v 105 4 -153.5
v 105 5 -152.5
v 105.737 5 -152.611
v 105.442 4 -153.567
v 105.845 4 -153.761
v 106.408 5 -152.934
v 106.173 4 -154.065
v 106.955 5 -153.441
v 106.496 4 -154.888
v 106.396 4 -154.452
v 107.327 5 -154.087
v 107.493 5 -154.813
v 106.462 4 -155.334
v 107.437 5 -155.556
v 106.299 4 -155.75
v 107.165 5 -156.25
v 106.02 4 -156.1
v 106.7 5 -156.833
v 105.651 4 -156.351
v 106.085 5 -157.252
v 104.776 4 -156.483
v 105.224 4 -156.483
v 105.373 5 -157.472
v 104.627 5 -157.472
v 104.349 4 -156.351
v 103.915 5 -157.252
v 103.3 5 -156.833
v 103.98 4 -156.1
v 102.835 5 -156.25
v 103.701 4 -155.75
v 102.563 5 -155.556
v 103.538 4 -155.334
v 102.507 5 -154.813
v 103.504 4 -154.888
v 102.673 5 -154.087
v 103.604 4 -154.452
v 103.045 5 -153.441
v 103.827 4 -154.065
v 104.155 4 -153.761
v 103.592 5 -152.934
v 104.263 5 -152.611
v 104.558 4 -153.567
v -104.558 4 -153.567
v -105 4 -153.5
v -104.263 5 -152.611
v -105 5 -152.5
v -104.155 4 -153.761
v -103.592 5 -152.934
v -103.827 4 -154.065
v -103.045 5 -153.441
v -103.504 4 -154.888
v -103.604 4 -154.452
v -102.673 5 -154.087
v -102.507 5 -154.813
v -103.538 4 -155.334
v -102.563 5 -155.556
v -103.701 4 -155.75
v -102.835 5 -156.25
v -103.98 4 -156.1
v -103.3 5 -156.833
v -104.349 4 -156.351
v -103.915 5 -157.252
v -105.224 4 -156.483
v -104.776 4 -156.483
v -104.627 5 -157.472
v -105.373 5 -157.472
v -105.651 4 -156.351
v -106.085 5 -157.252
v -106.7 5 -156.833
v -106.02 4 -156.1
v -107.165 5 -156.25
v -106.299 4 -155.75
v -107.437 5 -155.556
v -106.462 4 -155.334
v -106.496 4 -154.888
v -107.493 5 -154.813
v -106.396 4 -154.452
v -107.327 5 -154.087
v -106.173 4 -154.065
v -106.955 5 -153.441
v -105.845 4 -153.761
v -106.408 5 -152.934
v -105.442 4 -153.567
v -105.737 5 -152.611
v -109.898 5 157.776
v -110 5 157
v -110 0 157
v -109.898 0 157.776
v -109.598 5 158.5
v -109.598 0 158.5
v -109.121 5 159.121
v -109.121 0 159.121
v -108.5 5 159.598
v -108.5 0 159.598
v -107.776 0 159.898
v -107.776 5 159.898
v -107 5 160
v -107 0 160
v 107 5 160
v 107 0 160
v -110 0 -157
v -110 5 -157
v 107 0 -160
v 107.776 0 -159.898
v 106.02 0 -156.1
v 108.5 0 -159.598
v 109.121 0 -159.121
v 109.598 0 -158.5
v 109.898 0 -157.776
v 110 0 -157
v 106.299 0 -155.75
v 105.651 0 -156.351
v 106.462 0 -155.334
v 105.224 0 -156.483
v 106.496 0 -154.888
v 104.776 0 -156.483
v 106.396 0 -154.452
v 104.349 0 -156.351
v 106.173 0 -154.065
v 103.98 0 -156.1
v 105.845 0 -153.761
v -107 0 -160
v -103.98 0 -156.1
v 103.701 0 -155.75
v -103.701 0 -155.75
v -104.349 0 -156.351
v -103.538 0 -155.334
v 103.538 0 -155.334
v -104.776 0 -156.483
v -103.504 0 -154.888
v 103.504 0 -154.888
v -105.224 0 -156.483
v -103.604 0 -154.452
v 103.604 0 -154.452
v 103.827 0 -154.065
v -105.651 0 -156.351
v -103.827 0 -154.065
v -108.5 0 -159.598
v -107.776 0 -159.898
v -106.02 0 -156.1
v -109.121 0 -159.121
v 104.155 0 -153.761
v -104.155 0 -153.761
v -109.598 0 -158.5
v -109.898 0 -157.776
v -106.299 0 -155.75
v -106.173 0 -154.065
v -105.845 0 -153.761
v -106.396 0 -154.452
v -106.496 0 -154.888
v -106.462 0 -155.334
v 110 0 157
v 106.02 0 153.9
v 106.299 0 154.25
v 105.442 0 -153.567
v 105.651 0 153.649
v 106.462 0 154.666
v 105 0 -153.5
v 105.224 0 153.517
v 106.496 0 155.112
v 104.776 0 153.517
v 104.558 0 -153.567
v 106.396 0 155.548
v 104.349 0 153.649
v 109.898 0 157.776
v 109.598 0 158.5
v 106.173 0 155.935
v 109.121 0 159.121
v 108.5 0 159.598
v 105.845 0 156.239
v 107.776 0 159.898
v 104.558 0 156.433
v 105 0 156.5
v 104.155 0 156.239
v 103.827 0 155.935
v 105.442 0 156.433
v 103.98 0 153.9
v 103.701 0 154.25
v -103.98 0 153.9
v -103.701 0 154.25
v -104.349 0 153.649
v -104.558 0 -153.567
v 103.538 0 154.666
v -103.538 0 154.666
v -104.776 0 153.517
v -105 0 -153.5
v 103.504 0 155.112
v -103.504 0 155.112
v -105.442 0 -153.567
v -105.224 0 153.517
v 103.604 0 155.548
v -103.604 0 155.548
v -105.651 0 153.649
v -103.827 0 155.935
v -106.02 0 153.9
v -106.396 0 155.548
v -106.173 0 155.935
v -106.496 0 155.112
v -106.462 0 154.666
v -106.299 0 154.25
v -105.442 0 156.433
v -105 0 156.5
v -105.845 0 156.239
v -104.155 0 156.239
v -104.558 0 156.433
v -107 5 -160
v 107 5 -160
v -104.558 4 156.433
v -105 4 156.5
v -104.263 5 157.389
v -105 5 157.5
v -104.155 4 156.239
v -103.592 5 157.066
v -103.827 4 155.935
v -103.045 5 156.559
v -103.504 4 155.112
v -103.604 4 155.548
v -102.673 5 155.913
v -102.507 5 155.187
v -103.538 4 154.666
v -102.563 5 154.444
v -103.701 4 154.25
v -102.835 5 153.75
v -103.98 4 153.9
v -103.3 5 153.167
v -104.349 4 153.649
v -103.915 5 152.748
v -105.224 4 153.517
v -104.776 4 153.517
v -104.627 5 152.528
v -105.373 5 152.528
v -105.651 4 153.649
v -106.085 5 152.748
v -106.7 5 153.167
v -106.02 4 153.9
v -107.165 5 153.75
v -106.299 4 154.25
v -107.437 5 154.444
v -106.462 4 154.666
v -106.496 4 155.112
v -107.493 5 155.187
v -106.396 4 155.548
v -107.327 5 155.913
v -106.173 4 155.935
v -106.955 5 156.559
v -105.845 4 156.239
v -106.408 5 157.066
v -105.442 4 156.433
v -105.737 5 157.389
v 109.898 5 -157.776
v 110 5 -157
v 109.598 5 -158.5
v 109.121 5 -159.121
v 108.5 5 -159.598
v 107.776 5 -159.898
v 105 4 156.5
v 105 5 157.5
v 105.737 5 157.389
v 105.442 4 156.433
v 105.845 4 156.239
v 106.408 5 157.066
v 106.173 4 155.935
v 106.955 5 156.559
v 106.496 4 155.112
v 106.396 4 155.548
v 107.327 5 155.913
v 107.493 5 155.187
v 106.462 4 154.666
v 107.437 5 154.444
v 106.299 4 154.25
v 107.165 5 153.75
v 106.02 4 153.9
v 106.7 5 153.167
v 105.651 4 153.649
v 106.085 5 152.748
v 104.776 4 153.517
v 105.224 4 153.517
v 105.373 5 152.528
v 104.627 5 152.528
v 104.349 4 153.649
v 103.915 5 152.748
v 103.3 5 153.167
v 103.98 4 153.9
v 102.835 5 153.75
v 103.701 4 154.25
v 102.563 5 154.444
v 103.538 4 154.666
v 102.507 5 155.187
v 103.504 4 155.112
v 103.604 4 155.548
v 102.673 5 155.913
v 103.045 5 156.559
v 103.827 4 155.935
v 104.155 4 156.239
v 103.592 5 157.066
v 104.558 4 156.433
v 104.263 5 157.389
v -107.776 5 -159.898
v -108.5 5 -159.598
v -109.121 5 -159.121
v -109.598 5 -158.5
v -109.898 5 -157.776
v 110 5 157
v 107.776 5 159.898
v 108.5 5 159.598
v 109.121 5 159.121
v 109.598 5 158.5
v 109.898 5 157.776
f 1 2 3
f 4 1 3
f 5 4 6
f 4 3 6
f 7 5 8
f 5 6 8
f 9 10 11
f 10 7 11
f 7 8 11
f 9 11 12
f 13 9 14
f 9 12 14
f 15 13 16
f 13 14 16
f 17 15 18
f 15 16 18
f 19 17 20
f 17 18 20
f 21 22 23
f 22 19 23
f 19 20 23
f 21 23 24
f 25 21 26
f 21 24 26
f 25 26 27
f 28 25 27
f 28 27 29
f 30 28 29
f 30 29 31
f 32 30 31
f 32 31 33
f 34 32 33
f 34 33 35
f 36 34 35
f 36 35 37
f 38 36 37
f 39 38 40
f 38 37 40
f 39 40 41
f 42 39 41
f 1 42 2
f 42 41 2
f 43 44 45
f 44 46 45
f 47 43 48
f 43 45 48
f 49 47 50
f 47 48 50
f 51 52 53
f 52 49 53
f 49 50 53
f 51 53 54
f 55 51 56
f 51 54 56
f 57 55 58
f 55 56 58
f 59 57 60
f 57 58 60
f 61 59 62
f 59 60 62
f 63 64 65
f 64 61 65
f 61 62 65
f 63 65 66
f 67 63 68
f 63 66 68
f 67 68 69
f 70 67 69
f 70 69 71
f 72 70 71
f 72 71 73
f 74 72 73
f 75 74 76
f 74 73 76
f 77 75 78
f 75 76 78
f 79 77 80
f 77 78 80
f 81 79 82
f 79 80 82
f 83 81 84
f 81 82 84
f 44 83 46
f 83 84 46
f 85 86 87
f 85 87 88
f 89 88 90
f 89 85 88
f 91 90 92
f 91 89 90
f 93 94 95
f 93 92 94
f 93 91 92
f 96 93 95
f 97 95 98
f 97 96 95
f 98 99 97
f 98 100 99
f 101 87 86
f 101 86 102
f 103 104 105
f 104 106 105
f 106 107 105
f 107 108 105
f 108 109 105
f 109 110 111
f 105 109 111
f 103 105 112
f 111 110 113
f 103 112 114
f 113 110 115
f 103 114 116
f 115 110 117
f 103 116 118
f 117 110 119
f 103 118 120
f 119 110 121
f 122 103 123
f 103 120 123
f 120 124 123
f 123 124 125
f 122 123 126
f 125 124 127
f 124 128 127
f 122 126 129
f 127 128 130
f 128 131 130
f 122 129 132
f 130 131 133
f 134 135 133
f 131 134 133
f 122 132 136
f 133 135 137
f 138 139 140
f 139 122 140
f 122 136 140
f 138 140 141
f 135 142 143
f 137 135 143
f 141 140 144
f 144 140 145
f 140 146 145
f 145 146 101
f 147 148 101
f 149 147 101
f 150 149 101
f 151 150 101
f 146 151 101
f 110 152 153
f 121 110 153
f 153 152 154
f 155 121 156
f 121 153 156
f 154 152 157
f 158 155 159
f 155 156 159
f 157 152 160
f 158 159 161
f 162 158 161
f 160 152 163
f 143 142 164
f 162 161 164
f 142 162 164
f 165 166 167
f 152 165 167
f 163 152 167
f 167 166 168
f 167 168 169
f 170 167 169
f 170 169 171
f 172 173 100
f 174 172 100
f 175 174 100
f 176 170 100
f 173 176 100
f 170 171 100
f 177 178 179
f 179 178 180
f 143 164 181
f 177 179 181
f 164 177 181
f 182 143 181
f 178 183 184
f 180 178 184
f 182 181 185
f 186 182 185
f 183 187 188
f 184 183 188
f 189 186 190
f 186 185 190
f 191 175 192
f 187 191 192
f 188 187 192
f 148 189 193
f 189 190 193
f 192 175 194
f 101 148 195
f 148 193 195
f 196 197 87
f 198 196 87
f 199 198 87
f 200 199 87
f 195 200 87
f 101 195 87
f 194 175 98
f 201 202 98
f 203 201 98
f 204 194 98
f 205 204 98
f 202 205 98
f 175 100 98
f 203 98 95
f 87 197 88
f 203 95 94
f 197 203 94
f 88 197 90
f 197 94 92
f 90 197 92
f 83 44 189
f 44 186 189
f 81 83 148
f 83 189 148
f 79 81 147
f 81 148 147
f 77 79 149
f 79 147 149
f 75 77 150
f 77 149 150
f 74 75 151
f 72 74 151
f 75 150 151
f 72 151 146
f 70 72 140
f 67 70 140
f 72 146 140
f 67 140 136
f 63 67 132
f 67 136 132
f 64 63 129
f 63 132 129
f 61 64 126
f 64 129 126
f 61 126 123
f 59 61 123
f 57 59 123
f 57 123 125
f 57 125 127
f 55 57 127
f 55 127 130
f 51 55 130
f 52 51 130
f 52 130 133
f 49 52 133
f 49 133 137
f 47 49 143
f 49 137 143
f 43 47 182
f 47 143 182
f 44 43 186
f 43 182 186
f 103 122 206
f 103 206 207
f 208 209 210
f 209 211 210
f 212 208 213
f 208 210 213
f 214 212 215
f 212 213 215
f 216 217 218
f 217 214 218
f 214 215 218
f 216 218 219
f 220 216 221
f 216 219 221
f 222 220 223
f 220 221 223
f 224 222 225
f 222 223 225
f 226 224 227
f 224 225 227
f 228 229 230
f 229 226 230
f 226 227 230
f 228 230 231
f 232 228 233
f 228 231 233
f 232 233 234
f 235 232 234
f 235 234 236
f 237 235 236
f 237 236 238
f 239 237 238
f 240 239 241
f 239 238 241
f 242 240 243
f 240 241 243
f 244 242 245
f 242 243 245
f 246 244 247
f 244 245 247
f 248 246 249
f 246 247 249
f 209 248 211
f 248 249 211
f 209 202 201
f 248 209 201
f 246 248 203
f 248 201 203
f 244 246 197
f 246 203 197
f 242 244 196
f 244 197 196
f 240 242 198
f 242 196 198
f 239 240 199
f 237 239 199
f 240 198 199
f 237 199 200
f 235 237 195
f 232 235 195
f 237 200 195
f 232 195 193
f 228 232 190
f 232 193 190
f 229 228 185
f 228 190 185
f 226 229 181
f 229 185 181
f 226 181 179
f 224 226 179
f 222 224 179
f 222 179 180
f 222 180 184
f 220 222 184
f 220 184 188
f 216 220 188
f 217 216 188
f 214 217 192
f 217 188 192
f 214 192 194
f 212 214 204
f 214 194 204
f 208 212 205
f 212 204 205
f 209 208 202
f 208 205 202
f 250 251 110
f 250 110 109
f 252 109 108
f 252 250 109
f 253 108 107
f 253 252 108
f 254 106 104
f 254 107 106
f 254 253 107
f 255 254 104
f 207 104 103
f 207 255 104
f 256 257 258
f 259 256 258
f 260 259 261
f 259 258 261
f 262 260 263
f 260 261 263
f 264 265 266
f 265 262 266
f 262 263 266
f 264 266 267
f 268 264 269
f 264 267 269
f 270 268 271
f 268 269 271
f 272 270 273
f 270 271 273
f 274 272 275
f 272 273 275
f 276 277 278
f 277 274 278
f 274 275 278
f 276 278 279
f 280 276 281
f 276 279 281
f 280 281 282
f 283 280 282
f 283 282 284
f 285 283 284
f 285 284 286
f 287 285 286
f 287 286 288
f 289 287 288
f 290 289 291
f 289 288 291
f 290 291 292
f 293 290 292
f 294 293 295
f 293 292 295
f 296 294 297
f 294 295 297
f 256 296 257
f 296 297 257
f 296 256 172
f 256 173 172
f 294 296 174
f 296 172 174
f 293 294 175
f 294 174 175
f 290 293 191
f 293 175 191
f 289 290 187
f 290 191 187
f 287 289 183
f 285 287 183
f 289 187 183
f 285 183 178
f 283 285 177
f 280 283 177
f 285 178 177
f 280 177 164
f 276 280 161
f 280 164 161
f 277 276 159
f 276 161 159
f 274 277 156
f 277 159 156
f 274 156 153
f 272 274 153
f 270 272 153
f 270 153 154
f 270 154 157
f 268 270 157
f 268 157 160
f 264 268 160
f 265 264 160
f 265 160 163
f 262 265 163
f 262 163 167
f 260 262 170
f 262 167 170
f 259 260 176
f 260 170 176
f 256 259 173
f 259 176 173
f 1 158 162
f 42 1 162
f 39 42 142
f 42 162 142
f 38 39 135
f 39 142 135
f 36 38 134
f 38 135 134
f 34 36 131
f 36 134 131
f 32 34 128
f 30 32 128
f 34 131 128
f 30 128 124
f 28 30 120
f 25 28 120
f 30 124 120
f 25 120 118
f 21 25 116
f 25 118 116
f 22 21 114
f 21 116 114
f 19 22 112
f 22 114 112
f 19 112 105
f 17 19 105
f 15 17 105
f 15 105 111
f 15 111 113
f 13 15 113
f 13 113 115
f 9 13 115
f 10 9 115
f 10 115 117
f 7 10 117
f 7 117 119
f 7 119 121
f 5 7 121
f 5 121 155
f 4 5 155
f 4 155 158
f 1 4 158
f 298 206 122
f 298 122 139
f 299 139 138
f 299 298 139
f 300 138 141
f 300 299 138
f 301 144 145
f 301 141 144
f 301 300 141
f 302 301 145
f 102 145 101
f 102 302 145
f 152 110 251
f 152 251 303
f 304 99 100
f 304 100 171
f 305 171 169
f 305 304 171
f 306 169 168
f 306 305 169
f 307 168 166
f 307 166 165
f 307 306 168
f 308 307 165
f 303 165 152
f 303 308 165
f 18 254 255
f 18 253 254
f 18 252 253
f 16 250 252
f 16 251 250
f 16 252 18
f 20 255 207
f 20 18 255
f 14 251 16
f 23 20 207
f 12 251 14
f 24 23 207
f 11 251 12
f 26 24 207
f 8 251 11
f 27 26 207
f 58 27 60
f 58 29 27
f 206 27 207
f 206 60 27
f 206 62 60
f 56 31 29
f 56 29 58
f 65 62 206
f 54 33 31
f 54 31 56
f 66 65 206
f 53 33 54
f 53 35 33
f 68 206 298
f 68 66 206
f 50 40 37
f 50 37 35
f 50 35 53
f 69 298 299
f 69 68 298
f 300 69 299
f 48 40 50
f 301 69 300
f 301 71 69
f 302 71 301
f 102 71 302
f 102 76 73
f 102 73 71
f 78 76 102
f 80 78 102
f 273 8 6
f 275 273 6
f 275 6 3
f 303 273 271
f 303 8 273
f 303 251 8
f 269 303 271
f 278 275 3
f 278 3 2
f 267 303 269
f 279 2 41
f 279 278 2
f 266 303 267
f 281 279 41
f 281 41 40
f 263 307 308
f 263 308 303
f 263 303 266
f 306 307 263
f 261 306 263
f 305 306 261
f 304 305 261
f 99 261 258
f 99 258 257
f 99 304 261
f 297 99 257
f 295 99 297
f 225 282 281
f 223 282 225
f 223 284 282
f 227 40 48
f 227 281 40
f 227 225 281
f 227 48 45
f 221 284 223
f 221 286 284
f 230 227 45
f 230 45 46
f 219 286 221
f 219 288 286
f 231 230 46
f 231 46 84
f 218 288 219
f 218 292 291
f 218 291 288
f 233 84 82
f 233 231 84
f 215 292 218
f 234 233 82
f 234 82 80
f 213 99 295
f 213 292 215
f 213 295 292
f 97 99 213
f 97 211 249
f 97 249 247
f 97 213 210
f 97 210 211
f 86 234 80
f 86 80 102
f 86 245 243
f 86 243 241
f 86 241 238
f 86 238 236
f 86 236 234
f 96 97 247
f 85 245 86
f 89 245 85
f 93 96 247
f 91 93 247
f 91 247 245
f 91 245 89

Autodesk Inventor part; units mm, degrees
ref_plane "YZ Plane" through (0, 0, 0) normal (1, 0, 0) x (0, 1, 0)
ref_plane "XZ Plane" through (0, 0, 0) normal (0, 1, 0) x (-1, 0, 0)
ref_plane "XY Plane" through (0, 0, 0) normal (0, 0, 1) x (1, 0, 0)
sketch "Sketch1" plane through (0, 0, 0) normal (0, 1, 0) x (-1, 0, 0)
  line L0 (-110, 160) -> (110, 160)
  line L1 (110, 160) -> (110, -160)
  line L2 (110, -160) -> (-110, -160)
  line L3 (-110, -160) -> (-110, 160)
  line L4 (-110, 160) -> (110, -160) construction
  line L5 (110, 160) -> (-110, -160) construction
  point P0 (0, 0)
  dimension "d0" = 220
  dimension "d1" = 320
extrude "Plate1" add sketch "Sketch1" along normal blind 5
fillet "Fillet1" radius 3 4 edges at (110, 2.5, 160) (-110, 2.5, 160) (110, 2.5, -160) (-110, 2.5, -160)
sketch "Sketch2" plane through (0, 5, 0) normal (0, 1, 0) x (1, 0, 0)
  line L0 (105, 155) -> (-105, 155) construction
  line L1 (-105, 155) -> (-105, -155) construction
  line L2 (-105, -155) -> (105, -155) construction
  line L3 (105, -155) -> (105, 155) construction
  line L4 (105, 155) -> (-105, -155) construction
  line L5 (-105, 155) -> (105, -155) construction
  circle A0 centre (105, -155) radius 1.6
  circle A1 centre (-105, -155) radius 1.6
  circle A2 centre (-105, 155) radius 1.6
  circle A3 centre (105, 155) radius 1.6
  point P0 (0, 0)
  dimension "d4" = 310
  dimension "d5" = 210
  dimension "d6" = 3.2
hole "Hole1" at (105, 5, 155) at (-105, 5, 155) at (-105, 5, -155) at (105, 5, -155) direction (0, -1, 0) diameter 3 depth 8.8 countersink diameter 5 countersink angle 90
equation "\"d16\" = Thickness"
equation "\"TransitionRadius\" = BendRadius"
equation "\"JacobiRadiusSize\" = BendRadius"
equation "\"d2\" = BendRadius"
equation "\"Thickness\" = 5"
equation "\"BendRadius\" = 0.8"
properties part number "Bed Plate" material "Aluminum 6061"
